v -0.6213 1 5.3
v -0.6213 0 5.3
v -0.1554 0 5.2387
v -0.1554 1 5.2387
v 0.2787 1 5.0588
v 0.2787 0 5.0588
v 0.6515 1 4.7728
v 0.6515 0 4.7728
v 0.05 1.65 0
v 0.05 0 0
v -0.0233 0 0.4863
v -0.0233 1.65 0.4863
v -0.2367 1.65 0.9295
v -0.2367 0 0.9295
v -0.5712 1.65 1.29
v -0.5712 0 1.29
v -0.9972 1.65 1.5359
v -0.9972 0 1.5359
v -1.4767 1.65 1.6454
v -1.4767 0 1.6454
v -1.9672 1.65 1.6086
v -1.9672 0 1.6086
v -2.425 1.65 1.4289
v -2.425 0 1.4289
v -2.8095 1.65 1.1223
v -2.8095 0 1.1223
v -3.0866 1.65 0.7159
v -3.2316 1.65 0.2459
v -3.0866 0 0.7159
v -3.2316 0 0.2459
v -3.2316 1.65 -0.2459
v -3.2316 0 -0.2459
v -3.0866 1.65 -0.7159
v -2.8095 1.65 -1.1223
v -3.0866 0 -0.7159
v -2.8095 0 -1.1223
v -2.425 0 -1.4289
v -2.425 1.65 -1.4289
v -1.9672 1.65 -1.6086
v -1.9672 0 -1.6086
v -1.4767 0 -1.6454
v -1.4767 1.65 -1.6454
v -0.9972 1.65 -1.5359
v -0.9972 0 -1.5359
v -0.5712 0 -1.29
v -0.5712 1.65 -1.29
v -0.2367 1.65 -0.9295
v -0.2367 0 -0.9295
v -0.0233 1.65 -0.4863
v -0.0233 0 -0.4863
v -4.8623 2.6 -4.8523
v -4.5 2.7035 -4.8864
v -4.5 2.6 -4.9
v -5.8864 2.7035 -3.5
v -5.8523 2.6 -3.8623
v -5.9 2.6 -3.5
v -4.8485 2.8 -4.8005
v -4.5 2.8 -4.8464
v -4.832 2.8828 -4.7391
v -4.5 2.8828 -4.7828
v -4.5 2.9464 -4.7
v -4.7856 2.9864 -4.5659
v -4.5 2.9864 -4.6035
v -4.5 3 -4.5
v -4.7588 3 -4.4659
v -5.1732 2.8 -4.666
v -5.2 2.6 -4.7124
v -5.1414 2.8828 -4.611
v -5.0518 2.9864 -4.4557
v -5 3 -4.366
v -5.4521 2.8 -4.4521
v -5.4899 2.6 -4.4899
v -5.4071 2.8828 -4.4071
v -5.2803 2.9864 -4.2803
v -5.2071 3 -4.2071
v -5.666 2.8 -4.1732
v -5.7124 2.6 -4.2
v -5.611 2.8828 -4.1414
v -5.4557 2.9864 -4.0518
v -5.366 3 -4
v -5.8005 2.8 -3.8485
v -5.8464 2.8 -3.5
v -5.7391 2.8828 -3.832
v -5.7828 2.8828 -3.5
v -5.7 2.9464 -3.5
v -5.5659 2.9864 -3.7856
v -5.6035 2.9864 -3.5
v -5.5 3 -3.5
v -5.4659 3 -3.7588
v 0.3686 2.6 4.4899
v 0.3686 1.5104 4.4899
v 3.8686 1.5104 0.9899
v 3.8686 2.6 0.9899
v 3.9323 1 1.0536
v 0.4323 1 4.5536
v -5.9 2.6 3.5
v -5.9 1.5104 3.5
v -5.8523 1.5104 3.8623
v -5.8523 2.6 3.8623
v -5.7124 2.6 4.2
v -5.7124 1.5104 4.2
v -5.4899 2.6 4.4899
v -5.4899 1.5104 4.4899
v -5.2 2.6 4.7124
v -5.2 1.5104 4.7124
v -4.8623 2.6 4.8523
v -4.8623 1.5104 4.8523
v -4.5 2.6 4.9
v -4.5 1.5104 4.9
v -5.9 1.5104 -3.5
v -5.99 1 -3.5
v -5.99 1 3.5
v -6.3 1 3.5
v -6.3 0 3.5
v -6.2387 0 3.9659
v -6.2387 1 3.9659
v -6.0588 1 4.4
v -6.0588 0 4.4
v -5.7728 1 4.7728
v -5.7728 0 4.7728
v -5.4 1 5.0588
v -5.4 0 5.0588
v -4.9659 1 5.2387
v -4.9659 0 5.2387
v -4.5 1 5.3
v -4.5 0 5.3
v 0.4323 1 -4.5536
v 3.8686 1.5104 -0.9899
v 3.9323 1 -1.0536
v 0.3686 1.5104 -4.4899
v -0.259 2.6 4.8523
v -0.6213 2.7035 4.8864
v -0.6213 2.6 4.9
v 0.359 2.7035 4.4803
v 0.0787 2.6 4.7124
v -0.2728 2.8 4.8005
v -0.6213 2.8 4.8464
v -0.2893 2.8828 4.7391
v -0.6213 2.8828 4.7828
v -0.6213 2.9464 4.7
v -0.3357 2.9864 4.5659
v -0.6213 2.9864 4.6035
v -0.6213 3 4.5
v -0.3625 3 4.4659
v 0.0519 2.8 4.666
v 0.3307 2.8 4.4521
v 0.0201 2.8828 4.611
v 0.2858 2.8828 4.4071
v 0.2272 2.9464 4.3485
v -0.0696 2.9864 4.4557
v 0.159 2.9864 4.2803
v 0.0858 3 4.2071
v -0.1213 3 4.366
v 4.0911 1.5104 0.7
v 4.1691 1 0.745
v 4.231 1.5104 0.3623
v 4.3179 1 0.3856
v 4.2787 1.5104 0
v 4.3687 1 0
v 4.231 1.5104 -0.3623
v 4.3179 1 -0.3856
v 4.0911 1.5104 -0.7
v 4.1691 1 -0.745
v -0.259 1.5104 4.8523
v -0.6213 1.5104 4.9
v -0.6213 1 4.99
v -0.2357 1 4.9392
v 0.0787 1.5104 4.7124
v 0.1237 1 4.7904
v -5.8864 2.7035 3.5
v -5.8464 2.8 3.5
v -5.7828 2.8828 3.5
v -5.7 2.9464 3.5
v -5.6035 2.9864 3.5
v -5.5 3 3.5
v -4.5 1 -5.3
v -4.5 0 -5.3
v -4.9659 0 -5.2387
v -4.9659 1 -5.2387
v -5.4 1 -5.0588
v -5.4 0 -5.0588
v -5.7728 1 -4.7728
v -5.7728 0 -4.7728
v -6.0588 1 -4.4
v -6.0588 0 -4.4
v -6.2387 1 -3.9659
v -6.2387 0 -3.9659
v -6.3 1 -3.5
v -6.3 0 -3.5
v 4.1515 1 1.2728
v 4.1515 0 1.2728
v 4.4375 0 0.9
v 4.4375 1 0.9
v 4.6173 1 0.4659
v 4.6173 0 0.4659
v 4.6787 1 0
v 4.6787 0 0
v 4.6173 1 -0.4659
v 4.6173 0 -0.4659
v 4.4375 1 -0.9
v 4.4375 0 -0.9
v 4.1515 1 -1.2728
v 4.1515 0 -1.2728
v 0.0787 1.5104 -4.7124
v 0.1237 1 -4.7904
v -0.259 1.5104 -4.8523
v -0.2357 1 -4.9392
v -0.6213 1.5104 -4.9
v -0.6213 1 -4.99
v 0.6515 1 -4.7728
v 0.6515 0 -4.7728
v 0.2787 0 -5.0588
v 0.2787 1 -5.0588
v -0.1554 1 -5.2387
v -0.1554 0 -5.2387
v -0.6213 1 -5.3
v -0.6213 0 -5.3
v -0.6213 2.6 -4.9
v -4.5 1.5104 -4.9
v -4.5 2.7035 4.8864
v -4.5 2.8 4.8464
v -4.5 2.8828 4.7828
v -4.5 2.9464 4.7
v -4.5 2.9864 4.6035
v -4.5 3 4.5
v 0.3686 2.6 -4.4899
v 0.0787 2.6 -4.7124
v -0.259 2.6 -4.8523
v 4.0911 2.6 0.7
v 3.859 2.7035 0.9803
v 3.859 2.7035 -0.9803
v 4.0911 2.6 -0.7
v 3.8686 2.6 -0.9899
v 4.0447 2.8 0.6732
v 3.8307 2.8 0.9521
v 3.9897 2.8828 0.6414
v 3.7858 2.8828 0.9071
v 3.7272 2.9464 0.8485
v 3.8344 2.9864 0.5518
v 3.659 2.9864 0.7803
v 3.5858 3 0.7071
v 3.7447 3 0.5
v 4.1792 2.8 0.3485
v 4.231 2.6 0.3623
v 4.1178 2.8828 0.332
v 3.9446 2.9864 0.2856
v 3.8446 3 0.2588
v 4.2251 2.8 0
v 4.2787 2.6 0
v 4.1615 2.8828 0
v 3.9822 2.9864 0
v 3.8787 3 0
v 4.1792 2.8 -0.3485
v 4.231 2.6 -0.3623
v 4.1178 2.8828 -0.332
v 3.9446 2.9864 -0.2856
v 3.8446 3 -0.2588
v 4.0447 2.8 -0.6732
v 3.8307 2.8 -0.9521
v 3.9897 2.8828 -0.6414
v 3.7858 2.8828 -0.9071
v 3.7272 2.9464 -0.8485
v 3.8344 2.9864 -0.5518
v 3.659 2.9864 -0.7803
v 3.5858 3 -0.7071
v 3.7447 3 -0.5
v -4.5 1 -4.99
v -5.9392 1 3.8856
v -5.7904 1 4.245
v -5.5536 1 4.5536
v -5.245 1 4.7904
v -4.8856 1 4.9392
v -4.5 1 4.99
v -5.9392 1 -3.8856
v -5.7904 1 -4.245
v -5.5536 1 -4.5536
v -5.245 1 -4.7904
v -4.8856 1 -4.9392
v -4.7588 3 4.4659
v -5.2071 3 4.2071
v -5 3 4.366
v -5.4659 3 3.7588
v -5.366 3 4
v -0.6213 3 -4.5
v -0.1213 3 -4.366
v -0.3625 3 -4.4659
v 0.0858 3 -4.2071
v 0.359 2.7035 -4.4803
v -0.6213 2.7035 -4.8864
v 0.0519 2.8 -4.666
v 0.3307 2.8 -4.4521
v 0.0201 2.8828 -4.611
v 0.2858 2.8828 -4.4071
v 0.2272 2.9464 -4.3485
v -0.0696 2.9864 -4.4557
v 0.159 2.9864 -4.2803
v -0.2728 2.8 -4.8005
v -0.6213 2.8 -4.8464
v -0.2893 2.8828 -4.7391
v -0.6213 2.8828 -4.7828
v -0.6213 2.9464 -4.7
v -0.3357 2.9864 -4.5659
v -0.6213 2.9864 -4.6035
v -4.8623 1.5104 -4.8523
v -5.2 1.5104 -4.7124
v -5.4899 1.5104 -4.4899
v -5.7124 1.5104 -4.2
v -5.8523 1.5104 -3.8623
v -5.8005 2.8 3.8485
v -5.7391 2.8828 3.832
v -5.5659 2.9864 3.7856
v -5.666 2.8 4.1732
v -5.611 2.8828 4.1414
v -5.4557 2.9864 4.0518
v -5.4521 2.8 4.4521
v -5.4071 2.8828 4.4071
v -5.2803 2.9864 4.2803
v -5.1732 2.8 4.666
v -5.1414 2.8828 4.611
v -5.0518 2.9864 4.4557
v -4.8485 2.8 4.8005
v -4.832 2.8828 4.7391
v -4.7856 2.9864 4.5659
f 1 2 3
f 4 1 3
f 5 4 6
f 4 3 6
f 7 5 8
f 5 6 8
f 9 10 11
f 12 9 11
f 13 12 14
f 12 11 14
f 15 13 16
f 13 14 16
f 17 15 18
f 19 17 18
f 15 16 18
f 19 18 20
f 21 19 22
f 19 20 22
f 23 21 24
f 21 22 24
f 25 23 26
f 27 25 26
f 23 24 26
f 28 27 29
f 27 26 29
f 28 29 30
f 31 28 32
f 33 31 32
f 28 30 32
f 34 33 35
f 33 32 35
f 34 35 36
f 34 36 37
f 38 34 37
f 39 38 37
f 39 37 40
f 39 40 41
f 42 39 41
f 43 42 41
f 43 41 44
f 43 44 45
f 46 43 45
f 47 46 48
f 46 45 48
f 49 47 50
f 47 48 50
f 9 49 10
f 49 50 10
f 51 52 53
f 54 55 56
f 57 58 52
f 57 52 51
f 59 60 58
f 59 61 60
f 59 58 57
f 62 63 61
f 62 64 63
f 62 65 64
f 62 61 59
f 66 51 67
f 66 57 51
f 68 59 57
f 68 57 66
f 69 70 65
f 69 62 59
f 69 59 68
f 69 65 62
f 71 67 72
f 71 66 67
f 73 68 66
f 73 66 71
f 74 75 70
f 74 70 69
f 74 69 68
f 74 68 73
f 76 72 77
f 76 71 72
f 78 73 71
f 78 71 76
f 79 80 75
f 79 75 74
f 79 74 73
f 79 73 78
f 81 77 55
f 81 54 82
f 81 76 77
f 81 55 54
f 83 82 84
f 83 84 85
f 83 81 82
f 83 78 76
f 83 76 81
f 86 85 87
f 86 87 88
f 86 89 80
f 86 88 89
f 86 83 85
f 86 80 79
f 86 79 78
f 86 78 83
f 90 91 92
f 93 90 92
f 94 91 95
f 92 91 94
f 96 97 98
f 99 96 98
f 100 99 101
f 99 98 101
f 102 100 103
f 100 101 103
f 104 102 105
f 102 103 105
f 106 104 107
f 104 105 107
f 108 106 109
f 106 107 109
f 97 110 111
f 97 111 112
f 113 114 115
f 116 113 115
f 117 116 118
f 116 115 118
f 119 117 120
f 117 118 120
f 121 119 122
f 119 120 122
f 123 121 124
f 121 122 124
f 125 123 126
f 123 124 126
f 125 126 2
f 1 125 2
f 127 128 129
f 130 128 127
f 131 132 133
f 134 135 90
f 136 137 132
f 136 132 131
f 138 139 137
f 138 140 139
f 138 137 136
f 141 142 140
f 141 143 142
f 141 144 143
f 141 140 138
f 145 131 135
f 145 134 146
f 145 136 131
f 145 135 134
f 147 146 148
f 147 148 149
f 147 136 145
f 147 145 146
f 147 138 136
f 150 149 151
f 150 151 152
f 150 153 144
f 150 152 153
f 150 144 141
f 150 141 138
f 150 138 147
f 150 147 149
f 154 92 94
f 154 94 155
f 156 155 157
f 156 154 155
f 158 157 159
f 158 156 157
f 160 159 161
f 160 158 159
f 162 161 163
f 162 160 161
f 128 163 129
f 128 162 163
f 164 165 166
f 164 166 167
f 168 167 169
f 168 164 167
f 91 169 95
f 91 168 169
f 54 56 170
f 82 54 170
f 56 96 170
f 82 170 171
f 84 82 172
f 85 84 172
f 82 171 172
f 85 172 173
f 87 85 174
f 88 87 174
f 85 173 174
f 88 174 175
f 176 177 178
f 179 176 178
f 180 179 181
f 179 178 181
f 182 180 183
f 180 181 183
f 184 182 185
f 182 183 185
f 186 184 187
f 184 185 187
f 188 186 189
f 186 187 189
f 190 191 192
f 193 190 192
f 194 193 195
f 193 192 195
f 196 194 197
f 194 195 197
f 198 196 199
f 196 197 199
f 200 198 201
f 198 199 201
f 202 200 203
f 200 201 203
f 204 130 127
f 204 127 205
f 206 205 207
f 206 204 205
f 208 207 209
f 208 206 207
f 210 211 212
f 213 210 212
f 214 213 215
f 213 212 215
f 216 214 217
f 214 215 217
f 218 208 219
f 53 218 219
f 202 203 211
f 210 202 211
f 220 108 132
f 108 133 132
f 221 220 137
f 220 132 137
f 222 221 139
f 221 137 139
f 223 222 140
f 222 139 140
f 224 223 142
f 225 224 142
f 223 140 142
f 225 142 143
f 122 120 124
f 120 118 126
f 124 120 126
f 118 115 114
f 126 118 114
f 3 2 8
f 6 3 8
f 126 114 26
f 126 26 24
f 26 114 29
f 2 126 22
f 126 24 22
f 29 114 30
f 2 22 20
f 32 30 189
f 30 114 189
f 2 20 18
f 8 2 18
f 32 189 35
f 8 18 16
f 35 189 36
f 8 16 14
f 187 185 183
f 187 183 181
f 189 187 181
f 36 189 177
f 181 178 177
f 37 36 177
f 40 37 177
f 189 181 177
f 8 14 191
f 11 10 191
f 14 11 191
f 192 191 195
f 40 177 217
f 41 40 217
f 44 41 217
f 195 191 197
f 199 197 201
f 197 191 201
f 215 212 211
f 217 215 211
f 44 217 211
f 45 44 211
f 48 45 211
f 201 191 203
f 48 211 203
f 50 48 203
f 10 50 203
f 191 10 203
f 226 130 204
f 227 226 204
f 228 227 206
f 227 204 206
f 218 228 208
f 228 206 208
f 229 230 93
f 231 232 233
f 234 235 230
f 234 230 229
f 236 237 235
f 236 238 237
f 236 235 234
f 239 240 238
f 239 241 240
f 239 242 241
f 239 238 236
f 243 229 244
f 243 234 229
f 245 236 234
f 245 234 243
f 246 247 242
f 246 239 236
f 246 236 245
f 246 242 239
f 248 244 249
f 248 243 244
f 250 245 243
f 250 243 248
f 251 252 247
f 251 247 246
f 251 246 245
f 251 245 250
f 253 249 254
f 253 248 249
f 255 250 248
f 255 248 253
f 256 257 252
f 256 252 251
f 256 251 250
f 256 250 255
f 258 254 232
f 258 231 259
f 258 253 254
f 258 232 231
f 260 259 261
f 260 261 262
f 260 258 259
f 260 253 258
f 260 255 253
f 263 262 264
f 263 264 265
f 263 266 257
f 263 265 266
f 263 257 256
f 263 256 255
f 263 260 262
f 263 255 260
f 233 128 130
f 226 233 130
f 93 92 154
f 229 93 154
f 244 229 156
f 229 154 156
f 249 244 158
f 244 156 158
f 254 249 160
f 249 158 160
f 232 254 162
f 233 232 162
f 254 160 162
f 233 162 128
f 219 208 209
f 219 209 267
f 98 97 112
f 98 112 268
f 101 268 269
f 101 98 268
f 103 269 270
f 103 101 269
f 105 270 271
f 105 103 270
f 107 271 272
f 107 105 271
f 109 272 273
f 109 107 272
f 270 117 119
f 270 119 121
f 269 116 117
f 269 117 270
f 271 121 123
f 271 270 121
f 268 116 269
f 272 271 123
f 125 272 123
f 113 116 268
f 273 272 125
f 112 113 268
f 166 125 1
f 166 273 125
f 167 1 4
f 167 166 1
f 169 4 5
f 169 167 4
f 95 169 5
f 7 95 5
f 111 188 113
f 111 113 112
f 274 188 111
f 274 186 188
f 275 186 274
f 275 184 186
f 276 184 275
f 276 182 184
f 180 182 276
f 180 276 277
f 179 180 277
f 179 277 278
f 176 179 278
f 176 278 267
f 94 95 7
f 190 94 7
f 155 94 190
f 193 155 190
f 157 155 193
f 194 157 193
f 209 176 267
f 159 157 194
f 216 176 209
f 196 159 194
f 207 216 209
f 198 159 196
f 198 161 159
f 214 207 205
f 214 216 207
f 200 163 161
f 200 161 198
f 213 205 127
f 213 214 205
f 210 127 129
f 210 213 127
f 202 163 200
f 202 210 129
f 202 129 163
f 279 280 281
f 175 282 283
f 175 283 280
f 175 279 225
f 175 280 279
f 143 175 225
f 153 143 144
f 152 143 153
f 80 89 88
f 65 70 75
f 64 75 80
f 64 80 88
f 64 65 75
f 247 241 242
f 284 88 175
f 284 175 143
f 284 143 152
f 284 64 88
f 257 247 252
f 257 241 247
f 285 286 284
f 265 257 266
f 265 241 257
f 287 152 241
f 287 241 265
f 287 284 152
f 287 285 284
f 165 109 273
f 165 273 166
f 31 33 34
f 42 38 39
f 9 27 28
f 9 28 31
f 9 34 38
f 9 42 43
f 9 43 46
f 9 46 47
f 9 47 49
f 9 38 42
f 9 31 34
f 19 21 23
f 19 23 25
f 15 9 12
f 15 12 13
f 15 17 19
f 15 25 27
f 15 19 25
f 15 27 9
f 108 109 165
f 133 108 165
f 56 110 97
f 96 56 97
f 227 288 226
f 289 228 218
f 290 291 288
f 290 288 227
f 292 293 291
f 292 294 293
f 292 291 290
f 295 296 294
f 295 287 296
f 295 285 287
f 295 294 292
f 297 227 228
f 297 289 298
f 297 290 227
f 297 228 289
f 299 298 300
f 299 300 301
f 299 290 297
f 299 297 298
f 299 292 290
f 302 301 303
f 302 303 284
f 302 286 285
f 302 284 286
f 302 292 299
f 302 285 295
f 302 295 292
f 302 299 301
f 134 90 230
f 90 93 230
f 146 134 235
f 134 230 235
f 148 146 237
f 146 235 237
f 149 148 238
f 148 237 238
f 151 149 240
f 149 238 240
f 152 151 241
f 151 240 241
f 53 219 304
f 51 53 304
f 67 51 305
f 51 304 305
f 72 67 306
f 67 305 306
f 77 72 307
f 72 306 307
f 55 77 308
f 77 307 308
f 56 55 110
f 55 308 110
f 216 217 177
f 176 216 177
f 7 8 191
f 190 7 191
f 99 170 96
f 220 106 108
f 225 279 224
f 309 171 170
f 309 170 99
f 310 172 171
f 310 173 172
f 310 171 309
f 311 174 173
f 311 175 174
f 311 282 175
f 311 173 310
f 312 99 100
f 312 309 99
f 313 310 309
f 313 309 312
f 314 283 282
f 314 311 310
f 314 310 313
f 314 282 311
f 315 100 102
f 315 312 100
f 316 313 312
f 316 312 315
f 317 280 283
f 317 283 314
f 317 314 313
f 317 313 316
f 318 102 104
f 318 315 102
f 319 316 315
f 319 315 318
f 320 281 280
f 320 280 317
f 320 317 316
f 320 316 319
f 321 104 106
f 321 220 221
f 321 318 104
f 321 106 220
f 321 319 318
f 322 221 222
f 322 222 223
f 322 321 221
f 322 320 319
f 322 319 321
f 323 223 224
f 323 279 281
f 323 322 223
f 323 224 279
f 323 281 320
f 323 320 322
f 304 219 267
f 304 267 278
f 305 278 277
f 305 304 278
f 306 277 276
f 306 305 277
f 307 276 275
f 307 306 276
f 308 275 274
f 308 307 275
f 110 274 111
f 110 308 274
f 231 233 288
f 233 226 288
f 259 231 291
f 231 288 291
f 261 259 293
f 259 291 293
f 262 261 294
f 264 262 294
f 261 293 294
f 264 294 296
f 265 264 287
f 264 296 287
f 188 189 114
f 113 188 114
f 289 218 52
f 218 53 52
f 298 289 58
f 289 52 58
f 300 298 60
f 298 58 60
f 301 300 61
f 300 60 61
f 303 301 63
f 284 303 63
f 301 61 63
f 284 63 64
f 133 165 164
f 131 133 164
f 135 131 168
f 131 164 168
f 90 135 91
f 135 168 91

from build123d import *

# Parameters (mm, degrees)
EXTRUDE_3_DEPTH     = 1
EXTRUDE_4_DEPTH     = 2
CHAMFER_1_SIZE      = 0.09
CHAMFER_1_SIZE2     = 0.510415364
FILLET_3_R          = 0.4
SKETCH_8_R          = 1.65
CUT_EXTRUDE_1_DEPTH = 1.65


with BuildPart() as part:
    # 草图5 → 凸台-拉伸3 (new body)
    with BuildSketch(Plane(origin=(0, 0, 0), x_dir=(1, 0, 0), z_dir=(0, 1, 0))):
        with BuildLine():
            Line((-4.5, -5.3), (-0.621320344, -5.3))
            ThreePointArc((-0.621320344, -5.3), (0.067509835, -5.162983159), (0.651471863, -4.772792206))
            Line((0.651471863, -4.772792206), (4.151471863, -1.272792206))
            ThreePointArc((4.151471863, -1.272792206), (4.678679656, 0), (4.151471863, 1.272792206))
            Line((4.151471863, 1.272792206), (0.651471863, 4.772792206))
            ThreePointArc((0.651471863, 4.772792206), (0.067509835, 5.162983159), (-0.621320344, 5.3))
            Line((-0.621320344, 5.3), (-4.5, 5.3))
            ThreePointArc((-4.5, 5.3), (-5.772792206, 4.772792206), (-6.3, 3.5))
            Line((-6.3, 3.5), (-6.3, -3.5))
            ThreePointArc((-6.3, -3.5), (-5.772792206, -4.772792206), (-4.5, -5.3))
        make_face()
    extrude(amount=EXTRUDE_3_DEPTH)

    # 草图6 → 凸台-拉伸4 (add)
    with BuildSketch(Plane(origin=(0, 1, 0), x_dir=(1, 0, 0), z_dir=(0, 1, 0))):
        with BuildLine():
            Line((-4.5, -4.9), (-0.621320344, -4.9))
            ThreePointArc((-0.621320344, -4.9), (-0.085563538, -4.793431346), (0.36862915, -4.489949494))
            Line((0.36862915, -4.489949494), (3.86862915, -0.989949494))
            ThreePointArc((3.86862915, -0.989949494), (4.278679656, 0), (3.86862915, 0.989949494))
            Line((3.86862915, 0.989949494), (0.36862915, 4.489949494))
            ThreePointArc((0.36862915, 4.489949494), (-0.085563538, 4.793431346), (-0.621320344, 4.9))
            Line((-0.621320344, 4.9), (-4.5, 4.9))
            ThreePointArc((-4.5, 4.9), (-5.489949494, 4.489949494), (-5.9, 3.5))
            Line((-5.9, 3.5), (-5.9, -3.5))
            ThreePointArc((-5.9, -3.5), (-5.489949494, -4.489949494), (-4.5, -4.9))
        make_face()
    extrude(amount=EXTRUDE_4_DEPTH)

    # 倒角1
    chamfer_1_edges = [part.edges().sort_by_distance(p)[0] for p in [
        (-5.489949494, 1, 4.489949494),
        (-2.560660172, 1, 4.9),
        (-0.085563538, 1, 4.793431346),
        (2.11862915, 1, 2.739949494),
        (4.278679656, 1, 0),
        (2.11862915, 1, -2.739949494),
        (-0.085563538, 1, -4.793431346),
        (-2.560660172, 1, -4.9),
        (-5.489949494, 1, -4.489949494),
        (-5.9, 1, 0),
    ]]
    chamfer_1_side = [part.faces().sort_by_distance(p)[0] for p in [
        (-2.560660172, 1, 5.1473922),
    ]]
    chamfer(chamfer_1_edges, length=CHAMFER_1_SIZE, length2=CHAMFER_1_SIZE2, reference=chamfer_1_side[0])

    # 圆角3
    fillet_3_edges = [part.edges().sort_by_distance(p)[0] for p in [
        (-5.489949494, 3, 4.489949494),
        (-2.560660172, 3, 4.9),
        (-0.085563538, 3, 4.793431346),
        (2.11862915, 3, 2.739949494),
        (4.278679656, 3, 0),
        (2.11862915, 3, -2.739949494),
        (-0.085563538, 3, -4.793431346),
        (-2.560660172, 3, -4.9),
        (-5.489949494, 3, -4.489949494),
        (-5.9, 3, 0),
    ]]
    fillet(fillet_3_edges, radius=FILLET_3_R)

    # 草图8 → 切除-拉伸1 (cut)
    with BuildSketch(Plane.XZ):
        with Locations((-1.6, 0)):
            Circle(SKETCH_8_R)
    extrude(amount=-CUT_EXTRUDE_1_DEPTH, mode=Mode.SUBTRACT)


solid = part.part
